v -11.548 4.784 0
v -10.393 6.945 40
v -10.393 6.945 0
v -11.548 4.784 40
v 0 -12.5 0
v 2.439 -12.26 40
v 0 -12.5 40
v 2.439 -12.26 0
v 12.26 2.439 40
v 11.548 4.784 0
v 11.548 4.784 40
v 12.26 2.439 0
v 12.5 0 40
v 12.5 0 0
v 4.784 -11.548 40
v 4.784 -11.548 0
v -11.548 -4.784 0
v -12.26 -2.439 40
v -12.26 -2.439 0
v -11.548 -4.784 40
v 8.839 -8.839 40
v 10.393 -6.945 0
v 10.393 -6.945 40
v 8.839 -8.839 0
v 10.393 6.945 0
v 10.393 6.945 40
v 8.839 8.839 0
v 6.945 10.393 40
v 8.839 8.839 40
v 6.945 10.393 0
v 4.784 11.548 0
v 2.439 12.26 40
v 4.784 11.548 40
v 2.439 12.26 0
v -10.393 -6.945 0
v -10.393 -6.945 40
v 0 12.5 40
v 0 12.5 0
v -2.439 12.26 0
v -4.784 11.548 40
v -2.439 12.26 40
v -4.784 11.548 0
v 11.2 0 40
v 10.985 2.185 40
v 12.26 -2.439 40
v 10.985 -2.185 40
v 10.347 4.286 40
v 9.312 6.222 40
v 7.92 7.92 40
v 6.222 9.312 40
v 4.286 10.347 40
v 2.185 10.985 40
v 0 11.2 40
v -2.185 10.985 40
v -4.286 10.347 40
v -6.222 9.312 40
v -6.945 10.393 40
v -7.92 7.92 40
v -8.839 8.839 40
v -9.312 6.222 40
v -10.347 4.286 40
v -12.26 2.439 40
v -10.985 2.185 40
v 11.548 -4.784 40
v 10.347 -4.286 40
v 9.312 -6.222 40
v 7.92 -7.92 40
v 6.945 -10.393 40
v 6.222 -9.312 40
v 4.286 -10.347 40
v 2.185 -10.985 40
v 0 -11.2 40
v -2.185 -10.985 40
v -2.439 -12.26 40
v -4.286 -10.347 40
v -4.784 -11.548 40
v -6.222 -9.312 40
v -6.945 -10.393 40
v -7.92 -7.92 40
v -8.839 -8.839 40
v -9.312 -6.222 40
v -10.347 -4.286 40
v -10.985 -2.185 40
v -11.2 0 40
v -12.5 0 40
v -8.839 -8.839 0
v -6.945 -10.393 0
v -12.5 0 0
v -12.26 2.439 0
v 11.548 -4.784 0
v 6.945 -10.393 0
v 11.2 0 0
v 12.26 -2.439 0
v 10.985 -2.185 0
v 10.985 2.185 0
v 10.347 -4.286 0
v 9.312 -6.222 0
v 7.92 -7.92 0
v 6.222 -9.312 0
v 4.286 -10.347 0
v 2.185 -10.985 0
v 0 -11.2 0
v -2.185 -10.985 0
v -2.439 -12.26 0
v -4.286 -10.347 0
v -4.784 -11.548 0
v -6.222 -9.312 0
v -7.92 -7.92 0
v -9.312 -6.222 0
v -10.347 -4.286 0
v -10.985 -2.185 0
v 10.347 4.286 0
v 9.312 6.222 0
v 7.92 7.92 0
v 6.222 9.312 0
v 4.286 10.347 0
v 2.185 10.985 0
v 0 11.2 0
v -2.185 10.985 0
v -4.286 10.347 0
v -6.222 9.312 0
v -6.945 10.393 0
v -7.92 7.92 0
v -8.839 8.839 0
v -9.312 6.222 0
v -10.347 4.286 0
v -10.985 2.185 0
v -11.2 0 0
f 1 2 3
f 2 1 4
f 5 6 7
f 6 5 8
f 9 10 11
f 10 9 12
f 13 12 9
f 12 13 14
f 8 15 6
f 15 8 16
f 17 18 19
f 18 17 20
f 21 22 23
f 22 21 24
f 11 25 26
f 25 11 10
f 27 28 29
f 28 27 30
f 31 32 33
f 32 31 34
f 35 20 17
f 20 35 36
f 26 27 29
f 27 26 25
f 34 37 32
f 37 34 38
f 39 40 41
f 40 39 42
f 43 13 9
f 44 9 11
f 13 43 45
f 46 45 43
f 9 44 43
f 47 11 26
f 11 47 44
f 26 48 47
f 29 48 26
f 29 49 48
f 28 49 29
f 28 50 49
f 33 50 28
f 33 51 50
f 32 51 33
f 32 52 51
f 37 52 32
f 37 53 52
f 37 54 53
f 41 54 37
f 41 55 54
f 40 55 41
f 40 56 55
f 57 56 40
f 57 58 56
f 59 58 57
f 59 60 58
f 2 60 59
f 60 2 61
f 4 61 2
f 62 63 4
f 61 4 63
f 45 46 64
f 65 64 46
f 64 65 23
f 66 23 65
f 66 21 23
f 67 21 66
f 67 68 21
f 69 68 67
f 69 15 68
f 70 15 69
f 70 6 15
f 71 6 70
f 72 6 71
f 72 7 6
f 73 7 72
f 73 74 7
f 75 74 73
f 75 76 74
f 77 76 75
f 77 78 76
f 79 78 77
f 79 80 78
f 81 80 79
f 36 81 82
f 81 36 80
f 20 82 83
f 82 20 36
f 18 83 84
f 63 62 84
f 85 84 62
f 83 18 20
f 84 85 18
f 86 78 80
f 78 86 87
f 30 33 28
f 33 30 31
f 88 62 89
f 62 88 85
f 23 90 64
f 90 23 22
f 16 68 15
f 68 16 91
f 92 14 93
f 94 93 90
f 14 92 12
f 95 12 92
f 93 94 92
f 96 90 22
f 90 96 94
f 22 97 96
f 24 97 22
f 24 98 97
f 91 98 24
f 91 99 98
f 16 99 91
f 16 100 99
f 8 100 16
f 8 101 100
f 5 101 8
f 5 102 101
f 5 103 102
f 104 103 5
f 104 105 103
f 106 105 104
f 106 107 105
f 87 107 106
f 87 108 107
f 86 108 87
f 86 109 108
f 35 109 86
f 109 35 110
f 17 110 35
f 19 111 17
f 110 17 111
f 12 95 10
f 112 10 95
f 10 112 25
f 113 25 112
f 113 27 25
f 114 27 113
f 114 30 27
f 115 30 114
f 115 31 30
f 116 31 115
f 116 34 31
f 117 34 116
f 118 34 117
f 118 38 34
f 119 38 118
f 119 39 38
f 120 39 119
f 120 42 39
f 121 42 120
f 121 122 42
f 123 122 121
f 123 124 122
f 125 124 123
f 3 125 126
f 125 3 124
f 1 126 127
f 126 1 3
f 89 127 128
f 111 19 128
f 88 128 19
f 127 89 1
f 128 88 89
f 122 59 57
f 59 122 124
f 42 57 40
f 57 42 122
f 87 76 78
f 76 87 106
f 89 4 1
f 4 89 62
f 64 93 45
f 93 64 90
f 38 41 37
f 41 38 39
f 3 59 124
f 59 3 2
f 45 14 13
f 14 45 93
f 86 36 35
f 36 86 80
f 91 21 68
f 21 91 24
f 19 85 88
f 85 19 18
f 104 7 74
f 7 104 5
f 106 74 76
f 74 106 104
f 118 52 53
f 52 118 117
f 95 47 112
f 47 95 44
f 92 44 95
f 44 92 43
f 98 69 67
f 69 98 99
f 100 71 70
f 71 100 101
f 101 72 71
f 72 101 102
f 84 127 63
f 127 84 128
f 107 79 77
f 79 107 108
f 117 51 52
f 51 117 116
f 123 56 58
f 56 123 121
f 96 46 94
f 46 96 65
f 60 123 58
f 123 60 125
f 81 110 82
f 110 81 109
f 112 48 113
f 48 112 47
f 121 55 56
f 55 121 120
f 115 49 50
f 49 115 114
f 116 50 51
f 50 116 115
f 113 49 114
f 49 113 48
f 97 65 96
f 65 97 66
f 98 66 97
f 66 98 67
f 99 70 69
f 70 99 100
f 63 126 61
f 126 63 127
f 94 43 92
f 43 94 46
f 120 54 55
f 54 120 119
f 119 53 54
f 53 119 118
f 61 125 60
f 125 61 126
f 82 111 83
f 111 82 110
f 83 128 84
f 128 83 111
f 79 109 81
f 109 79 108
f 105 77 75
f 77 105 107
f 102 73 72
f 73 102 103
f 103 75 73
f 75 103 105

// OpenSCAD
$fn = 32;

// ----------------------------------------------------------------------
// Thin tube: 1.3 mm wall
// ----------------------------------------------------------------------

// --- parameters (mm) ---
tube_od = 25;             // outer diameter
tube_h = 40;              // height, Z
wall = 1.3;               // wall thickness

difference() {
  cylinder(h = tube_h, d = tube_od);
  translate([0, 0, -1]) cylinder(h = tube_h + 2, d = tube_od - 2 * wall);
}
